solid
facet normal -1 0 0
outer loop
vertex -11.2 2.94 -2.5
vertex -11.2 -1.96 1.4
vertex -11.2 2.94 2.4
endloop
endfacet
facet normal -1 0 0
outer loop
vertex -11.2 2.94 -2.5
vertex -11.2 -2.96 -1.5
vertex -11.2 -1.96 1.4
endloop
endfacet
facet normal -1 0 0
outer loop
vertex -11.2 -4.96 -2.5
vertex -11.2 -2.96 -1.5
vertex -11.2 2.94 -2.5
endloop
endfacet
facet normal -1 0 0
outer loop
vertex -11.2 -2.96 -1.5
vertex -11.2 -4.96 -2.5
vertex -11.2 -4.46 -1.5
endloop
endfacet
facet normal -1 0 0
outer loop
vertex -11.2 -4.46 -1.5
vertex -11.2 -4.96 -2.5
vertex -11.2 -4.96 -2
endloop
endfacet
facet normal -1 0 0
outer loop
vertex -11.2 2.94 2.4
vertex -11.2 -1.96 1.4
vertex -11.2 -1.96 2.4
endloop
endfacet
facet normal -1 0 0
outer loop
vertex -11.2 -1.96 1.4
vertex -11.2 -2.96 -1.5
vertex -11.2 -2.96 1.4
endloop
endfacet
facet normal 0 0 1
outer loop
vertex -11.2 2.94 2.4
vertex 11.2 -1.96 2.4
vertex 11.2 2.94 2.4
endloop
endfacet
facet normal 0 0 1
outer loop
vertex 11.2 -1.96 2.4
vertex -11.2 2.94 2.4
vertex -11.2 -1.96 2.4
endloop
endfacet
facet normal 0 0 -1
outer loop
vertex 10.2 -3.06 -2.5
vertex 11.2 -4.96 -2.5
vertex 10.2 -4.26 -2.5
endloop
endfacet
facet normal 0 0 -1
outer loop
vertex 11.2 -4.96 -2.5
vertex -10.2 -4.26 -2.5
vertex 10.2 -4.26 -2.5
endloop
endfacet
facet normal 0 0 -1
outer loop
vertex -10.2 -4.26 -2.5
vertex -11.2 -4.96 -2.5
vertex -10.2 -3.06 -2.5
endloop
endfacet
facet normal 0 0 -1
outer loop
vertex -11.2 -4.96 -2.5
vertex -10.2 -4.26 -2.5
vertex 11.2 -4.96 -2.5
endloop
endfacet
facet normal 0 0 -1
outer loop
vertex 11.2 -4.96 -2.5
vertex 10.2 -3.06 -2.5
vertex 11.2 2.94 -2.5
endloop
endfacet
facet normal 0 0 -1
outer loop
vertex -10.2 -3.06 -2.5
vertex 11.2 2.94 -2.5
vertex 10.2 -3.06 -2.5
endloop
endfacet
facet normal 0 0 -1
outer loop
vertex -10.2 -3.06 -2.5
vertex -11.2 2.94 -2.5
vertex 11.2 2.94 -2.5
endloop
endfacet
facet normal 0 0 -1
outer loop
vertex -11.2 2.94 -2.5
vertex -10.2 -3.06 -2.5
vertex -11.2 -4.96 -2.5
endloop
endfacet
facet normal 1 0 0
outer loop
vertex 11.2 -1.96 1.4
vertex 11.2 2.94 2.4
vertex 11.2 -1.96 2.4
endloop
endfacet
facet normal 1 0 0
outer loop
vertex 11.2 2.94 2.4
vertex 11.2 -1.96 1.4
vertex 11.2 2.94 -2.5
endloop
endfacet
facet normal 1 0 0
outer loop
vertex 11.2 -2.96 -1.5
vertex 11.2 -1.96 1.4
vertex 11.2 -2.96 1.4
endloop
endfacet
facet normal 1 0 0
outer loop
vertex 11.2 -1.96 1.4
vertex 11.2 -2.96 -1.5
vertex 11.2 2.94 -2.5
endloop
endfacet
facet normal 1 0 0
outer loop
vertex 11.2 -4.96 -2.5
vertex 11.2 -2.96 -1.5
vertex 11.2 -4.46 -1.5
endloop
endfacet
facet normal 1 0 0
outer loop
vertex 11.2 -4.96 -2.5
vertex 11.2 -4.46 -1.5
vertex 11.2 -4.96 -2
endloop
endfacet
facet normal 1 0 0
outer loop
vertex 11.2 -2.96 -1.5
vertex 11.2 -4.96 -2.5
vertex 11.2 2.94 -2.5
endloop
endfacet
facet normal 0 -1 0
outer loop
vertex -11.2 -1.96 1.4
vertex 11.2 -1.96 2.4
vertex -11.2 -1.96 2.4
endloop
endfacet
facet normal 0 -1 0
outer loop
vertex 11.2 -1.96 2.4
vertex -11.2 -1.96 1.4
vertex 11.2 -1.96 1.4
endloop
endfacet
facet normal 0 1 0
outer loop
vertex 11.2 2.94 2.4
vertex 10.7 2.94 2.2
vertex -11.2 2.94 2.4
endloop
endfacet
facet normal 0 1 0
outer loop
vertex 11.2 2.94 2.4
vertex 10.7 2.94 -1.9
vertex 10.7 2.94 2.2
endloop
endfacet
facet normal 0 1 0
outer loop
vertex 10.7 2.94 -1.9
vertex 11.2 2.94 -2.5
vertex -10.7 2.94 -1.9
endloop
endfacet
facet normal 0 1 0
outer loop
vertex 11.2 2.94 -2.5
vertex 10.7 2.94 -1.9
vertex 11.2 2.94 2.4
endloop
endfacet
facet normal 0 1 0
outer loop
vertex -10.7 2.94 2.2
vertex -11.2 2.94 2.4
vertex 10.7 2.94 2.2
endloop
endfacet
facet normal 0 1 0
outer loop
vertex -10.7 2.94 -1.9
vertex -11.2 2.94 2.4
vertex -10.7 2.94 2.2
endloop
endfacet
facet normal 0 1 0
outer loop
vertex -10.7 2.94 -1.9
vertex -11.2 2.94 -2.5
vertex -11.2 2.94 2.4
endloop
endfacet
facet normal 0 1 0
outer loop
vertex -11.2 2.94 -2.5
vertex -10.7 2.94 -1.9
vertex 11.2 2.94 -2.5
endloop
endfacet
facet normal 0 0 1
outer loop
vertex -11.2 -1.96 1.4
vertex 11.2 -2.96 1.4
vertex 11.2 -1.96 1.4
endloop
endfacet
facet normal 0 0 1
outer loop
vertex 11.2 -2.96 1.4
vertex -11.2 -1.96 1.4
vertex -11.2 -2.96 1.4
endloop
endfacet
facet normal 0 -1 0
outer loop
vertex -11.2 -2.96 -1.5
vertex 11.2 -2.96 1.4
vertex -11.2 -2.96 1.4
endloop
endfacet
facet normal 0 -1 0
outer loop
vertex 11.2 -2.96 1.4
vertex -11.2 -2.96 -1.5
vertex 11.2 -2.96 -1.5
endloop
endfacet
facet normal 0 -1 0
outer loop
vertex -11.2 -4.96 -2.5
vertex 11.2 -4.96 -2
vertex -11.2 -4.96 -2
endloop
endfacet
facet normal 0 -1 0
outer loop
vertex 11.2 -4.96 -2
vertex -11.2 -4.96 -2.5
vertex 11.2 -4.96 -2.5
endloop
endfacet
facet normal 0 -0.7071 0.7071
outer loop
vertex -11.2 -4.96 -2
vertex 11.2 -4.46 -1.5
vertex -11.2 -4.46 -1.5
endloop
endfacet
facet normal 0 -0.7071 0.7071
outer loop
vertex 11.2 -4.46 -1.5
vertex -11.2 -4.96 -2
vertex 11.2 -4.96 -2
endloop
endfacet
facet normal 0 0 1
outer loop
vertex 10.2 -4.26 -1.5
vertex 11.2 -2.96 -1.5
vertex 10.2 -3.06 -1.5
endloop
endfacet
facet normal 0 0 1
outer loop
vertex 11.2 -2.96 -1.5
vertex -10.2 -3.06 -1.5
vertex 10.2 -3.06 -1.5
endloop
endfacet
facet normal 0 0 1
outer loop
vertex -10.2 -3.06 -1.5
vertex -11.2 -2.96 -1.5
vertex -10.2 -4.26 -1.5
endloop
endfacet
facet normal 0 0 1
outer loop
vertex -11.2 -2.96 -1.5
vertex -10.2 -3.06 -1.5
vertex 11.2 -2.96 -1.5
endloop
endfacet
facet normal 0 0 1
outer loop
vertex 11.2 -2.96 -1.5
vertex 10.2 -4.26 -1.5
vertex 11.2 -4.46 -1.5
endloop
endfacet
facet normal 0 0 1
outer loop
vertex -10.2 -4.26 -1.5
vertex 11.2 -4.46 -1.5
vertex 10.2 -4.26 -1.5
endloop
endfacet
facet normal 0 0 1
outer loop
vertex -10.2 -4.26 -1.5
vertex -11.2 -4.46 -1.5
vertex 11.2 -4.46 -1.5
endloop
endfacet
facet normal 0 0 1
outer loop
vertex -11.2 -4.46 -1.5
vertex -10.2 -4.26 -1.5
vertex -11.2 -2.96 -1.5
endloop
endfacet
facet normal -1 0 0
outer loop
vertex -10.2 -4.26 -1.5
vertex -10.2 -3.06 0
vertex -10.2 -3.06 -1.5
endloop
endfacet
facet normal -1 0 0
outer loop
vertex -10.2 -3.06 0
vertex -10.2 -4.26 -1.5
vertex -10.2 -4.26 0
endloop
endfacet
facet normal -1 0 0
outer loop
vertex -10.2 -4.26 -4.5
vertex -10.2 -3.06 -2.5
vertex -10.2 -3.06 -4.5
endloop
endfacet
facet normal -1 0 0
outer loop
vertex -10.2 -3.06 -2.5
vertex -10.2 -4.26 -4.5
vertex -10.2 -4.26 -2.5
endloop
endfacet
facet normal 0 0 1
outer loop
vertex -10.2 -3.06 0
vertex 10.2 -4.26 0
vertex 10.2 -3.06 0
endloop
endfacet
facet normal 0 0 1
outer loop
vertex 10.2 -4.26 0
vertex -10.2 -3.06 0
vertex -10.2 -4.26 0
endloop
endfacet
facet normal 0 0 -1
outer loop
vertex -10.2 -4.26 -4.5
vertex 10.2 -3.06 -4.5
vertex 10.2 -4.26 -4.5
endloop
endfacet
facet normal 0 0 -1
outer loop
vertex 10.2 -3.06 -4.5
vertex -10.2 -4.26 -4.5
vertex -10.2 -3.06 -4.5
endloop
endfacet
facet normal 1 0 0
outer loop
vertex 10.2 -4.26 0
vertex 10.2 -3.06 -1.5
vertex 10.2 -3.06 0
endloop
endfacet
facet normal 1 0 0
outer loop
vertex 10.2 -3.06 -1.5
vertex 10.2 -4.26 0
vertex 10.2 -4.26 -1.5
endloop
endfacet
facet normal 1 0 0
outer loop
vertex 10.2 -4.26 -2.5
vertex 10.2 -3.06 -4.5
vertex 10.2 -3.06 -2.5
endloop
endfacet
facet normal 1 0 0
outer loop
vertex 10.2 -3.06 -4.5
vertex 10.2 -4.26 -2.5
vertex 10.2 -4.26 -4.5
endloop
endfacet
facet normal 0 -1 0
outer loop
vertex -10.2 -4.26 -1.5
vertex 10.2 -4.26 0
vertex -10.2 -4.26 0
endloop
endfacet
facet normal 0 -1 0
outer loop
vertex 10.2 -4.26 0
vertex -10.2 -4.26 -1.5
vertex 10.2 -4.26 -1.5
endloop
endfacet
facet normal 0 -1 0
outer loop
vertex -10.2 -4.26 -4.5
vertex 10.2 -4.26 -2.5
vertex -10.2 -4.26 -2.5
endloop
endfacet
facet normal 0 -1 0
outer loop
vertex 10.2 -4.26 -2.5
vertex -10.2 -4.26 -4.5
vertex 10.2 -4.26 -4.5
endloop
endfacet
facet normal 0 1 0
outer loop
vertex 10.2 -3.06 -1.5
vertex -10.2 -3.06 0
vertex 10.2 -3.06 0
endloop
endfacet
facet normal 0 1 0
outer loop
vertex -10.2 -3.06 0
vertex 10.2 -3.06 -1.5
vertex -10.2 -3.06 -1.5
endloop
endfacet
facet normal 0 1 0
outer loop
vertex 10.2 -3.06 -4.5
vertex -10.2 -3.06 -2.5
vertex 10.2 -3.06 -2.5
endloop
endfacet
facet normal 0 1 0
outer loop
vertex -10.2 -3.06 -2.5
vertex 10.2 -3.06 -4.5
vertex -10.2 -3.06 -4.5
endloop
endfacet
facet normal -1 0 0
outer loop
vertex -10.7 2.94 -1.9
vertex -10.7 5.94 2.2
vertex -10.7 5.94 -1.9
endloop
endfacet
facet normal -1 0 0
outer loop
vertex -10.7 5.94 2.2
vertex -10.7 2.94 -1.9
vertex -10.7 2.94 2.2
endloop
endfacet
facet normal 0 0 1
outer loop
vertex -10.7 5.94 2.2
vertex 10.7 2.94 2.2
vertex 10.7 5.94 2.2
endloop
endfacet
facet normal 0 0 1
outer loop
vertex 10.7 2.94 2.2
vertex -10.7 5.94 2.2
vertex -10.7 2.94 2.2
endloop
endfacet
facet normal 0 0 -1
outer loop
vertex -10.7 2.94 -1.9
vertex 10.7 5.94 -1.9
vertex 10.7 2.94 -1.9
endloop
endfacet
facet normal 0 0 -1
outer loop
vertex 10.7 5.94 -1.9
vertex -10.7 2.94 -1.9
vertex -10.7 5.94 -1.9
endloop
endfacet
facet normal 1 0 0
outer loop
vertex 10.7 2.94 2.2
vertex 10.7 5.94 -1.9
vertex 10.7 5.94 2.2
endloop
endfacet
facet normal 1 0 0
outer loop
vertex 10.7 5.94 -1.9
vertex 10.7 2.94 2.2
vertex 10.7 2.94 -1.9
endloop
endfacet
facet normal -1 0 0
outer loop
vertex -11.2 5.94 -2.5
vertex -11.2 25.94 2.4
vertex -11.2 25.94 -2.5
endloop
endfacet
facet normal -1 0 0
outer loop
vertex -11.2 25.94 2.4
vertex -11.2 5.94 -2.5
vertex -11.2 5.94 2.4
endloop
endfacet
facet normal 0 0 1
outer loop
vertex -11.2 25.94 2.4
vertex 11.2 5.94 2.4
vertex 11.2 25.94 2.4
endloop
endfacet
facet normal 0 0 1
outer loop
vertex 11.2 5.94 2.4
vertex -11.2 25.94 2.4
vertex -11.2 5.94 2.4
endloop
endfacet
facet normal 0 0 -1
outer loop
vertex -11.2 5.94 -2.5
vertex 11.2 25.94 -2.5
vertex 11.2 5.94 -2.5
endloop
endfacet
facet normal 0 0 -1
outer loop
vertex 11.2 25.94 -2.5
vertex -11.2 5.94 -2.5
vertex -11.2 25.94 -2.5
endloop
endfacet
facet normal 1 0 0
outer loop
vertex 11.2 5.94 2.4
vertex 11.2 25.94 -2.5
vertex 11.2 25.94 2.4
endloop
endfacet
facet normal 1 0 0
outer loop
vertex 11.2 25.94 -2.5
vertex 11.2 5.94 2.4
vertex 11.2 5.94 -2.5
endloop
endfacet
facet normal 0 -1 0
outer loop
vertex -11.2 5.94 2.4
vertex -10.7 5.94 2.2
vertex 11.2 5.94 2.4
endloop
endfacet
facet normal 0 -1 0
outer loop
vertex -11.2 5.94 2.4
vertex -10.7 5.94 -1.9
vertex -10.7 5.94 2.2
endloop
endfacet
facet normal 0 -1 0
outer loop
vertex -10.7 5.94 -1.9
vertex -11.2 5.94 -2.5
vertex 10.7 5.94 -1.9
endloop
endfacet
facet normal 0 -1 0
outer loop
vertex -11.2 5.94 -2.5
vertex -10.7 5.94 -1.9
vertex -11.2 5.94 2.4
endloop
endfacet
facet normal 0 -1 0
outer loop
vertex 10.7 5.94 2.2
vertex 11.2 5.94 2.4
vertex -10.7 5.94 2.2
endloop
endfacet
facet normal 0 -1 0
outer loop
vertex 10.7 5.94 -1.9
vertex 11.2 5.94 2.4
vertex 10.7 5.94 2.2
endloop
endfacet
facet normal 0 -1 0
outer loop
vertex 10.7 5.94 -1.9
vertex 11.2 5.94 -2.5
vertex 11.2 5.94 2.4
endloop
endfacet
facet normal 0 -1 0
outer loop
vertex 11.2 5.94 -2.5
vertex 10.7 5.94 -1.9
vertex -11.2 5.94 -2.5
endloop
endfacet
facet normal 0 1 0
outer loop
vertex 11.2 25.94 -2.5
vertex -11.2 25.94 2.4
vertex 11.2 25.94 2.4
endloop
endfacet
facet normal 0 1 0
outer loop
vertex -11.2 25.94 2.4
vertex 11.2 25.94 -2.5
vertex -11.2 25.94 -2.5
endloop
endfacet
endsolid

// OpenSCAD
N=8;
A=2.4+N*2.5;
rotate([0,0,180])
translate([-A/2,-2.94,-2.5])
{
	cube([A,4.9,4.9]);
	cube([A,5.9,3.9]);
	hull()
	{
		cube([A,7.4,1]);
		cube([A,7.9,0.5]);
	}
	translate([1,6,-2])cube([A-2,1.2,4.5]); // Assumes cropped pins
	// Plug
	translate([0.5,-20,0.6])cube([A-1,21,4.1]);
	translate([0,-23,0])cube([A,20,4.9]);
}
